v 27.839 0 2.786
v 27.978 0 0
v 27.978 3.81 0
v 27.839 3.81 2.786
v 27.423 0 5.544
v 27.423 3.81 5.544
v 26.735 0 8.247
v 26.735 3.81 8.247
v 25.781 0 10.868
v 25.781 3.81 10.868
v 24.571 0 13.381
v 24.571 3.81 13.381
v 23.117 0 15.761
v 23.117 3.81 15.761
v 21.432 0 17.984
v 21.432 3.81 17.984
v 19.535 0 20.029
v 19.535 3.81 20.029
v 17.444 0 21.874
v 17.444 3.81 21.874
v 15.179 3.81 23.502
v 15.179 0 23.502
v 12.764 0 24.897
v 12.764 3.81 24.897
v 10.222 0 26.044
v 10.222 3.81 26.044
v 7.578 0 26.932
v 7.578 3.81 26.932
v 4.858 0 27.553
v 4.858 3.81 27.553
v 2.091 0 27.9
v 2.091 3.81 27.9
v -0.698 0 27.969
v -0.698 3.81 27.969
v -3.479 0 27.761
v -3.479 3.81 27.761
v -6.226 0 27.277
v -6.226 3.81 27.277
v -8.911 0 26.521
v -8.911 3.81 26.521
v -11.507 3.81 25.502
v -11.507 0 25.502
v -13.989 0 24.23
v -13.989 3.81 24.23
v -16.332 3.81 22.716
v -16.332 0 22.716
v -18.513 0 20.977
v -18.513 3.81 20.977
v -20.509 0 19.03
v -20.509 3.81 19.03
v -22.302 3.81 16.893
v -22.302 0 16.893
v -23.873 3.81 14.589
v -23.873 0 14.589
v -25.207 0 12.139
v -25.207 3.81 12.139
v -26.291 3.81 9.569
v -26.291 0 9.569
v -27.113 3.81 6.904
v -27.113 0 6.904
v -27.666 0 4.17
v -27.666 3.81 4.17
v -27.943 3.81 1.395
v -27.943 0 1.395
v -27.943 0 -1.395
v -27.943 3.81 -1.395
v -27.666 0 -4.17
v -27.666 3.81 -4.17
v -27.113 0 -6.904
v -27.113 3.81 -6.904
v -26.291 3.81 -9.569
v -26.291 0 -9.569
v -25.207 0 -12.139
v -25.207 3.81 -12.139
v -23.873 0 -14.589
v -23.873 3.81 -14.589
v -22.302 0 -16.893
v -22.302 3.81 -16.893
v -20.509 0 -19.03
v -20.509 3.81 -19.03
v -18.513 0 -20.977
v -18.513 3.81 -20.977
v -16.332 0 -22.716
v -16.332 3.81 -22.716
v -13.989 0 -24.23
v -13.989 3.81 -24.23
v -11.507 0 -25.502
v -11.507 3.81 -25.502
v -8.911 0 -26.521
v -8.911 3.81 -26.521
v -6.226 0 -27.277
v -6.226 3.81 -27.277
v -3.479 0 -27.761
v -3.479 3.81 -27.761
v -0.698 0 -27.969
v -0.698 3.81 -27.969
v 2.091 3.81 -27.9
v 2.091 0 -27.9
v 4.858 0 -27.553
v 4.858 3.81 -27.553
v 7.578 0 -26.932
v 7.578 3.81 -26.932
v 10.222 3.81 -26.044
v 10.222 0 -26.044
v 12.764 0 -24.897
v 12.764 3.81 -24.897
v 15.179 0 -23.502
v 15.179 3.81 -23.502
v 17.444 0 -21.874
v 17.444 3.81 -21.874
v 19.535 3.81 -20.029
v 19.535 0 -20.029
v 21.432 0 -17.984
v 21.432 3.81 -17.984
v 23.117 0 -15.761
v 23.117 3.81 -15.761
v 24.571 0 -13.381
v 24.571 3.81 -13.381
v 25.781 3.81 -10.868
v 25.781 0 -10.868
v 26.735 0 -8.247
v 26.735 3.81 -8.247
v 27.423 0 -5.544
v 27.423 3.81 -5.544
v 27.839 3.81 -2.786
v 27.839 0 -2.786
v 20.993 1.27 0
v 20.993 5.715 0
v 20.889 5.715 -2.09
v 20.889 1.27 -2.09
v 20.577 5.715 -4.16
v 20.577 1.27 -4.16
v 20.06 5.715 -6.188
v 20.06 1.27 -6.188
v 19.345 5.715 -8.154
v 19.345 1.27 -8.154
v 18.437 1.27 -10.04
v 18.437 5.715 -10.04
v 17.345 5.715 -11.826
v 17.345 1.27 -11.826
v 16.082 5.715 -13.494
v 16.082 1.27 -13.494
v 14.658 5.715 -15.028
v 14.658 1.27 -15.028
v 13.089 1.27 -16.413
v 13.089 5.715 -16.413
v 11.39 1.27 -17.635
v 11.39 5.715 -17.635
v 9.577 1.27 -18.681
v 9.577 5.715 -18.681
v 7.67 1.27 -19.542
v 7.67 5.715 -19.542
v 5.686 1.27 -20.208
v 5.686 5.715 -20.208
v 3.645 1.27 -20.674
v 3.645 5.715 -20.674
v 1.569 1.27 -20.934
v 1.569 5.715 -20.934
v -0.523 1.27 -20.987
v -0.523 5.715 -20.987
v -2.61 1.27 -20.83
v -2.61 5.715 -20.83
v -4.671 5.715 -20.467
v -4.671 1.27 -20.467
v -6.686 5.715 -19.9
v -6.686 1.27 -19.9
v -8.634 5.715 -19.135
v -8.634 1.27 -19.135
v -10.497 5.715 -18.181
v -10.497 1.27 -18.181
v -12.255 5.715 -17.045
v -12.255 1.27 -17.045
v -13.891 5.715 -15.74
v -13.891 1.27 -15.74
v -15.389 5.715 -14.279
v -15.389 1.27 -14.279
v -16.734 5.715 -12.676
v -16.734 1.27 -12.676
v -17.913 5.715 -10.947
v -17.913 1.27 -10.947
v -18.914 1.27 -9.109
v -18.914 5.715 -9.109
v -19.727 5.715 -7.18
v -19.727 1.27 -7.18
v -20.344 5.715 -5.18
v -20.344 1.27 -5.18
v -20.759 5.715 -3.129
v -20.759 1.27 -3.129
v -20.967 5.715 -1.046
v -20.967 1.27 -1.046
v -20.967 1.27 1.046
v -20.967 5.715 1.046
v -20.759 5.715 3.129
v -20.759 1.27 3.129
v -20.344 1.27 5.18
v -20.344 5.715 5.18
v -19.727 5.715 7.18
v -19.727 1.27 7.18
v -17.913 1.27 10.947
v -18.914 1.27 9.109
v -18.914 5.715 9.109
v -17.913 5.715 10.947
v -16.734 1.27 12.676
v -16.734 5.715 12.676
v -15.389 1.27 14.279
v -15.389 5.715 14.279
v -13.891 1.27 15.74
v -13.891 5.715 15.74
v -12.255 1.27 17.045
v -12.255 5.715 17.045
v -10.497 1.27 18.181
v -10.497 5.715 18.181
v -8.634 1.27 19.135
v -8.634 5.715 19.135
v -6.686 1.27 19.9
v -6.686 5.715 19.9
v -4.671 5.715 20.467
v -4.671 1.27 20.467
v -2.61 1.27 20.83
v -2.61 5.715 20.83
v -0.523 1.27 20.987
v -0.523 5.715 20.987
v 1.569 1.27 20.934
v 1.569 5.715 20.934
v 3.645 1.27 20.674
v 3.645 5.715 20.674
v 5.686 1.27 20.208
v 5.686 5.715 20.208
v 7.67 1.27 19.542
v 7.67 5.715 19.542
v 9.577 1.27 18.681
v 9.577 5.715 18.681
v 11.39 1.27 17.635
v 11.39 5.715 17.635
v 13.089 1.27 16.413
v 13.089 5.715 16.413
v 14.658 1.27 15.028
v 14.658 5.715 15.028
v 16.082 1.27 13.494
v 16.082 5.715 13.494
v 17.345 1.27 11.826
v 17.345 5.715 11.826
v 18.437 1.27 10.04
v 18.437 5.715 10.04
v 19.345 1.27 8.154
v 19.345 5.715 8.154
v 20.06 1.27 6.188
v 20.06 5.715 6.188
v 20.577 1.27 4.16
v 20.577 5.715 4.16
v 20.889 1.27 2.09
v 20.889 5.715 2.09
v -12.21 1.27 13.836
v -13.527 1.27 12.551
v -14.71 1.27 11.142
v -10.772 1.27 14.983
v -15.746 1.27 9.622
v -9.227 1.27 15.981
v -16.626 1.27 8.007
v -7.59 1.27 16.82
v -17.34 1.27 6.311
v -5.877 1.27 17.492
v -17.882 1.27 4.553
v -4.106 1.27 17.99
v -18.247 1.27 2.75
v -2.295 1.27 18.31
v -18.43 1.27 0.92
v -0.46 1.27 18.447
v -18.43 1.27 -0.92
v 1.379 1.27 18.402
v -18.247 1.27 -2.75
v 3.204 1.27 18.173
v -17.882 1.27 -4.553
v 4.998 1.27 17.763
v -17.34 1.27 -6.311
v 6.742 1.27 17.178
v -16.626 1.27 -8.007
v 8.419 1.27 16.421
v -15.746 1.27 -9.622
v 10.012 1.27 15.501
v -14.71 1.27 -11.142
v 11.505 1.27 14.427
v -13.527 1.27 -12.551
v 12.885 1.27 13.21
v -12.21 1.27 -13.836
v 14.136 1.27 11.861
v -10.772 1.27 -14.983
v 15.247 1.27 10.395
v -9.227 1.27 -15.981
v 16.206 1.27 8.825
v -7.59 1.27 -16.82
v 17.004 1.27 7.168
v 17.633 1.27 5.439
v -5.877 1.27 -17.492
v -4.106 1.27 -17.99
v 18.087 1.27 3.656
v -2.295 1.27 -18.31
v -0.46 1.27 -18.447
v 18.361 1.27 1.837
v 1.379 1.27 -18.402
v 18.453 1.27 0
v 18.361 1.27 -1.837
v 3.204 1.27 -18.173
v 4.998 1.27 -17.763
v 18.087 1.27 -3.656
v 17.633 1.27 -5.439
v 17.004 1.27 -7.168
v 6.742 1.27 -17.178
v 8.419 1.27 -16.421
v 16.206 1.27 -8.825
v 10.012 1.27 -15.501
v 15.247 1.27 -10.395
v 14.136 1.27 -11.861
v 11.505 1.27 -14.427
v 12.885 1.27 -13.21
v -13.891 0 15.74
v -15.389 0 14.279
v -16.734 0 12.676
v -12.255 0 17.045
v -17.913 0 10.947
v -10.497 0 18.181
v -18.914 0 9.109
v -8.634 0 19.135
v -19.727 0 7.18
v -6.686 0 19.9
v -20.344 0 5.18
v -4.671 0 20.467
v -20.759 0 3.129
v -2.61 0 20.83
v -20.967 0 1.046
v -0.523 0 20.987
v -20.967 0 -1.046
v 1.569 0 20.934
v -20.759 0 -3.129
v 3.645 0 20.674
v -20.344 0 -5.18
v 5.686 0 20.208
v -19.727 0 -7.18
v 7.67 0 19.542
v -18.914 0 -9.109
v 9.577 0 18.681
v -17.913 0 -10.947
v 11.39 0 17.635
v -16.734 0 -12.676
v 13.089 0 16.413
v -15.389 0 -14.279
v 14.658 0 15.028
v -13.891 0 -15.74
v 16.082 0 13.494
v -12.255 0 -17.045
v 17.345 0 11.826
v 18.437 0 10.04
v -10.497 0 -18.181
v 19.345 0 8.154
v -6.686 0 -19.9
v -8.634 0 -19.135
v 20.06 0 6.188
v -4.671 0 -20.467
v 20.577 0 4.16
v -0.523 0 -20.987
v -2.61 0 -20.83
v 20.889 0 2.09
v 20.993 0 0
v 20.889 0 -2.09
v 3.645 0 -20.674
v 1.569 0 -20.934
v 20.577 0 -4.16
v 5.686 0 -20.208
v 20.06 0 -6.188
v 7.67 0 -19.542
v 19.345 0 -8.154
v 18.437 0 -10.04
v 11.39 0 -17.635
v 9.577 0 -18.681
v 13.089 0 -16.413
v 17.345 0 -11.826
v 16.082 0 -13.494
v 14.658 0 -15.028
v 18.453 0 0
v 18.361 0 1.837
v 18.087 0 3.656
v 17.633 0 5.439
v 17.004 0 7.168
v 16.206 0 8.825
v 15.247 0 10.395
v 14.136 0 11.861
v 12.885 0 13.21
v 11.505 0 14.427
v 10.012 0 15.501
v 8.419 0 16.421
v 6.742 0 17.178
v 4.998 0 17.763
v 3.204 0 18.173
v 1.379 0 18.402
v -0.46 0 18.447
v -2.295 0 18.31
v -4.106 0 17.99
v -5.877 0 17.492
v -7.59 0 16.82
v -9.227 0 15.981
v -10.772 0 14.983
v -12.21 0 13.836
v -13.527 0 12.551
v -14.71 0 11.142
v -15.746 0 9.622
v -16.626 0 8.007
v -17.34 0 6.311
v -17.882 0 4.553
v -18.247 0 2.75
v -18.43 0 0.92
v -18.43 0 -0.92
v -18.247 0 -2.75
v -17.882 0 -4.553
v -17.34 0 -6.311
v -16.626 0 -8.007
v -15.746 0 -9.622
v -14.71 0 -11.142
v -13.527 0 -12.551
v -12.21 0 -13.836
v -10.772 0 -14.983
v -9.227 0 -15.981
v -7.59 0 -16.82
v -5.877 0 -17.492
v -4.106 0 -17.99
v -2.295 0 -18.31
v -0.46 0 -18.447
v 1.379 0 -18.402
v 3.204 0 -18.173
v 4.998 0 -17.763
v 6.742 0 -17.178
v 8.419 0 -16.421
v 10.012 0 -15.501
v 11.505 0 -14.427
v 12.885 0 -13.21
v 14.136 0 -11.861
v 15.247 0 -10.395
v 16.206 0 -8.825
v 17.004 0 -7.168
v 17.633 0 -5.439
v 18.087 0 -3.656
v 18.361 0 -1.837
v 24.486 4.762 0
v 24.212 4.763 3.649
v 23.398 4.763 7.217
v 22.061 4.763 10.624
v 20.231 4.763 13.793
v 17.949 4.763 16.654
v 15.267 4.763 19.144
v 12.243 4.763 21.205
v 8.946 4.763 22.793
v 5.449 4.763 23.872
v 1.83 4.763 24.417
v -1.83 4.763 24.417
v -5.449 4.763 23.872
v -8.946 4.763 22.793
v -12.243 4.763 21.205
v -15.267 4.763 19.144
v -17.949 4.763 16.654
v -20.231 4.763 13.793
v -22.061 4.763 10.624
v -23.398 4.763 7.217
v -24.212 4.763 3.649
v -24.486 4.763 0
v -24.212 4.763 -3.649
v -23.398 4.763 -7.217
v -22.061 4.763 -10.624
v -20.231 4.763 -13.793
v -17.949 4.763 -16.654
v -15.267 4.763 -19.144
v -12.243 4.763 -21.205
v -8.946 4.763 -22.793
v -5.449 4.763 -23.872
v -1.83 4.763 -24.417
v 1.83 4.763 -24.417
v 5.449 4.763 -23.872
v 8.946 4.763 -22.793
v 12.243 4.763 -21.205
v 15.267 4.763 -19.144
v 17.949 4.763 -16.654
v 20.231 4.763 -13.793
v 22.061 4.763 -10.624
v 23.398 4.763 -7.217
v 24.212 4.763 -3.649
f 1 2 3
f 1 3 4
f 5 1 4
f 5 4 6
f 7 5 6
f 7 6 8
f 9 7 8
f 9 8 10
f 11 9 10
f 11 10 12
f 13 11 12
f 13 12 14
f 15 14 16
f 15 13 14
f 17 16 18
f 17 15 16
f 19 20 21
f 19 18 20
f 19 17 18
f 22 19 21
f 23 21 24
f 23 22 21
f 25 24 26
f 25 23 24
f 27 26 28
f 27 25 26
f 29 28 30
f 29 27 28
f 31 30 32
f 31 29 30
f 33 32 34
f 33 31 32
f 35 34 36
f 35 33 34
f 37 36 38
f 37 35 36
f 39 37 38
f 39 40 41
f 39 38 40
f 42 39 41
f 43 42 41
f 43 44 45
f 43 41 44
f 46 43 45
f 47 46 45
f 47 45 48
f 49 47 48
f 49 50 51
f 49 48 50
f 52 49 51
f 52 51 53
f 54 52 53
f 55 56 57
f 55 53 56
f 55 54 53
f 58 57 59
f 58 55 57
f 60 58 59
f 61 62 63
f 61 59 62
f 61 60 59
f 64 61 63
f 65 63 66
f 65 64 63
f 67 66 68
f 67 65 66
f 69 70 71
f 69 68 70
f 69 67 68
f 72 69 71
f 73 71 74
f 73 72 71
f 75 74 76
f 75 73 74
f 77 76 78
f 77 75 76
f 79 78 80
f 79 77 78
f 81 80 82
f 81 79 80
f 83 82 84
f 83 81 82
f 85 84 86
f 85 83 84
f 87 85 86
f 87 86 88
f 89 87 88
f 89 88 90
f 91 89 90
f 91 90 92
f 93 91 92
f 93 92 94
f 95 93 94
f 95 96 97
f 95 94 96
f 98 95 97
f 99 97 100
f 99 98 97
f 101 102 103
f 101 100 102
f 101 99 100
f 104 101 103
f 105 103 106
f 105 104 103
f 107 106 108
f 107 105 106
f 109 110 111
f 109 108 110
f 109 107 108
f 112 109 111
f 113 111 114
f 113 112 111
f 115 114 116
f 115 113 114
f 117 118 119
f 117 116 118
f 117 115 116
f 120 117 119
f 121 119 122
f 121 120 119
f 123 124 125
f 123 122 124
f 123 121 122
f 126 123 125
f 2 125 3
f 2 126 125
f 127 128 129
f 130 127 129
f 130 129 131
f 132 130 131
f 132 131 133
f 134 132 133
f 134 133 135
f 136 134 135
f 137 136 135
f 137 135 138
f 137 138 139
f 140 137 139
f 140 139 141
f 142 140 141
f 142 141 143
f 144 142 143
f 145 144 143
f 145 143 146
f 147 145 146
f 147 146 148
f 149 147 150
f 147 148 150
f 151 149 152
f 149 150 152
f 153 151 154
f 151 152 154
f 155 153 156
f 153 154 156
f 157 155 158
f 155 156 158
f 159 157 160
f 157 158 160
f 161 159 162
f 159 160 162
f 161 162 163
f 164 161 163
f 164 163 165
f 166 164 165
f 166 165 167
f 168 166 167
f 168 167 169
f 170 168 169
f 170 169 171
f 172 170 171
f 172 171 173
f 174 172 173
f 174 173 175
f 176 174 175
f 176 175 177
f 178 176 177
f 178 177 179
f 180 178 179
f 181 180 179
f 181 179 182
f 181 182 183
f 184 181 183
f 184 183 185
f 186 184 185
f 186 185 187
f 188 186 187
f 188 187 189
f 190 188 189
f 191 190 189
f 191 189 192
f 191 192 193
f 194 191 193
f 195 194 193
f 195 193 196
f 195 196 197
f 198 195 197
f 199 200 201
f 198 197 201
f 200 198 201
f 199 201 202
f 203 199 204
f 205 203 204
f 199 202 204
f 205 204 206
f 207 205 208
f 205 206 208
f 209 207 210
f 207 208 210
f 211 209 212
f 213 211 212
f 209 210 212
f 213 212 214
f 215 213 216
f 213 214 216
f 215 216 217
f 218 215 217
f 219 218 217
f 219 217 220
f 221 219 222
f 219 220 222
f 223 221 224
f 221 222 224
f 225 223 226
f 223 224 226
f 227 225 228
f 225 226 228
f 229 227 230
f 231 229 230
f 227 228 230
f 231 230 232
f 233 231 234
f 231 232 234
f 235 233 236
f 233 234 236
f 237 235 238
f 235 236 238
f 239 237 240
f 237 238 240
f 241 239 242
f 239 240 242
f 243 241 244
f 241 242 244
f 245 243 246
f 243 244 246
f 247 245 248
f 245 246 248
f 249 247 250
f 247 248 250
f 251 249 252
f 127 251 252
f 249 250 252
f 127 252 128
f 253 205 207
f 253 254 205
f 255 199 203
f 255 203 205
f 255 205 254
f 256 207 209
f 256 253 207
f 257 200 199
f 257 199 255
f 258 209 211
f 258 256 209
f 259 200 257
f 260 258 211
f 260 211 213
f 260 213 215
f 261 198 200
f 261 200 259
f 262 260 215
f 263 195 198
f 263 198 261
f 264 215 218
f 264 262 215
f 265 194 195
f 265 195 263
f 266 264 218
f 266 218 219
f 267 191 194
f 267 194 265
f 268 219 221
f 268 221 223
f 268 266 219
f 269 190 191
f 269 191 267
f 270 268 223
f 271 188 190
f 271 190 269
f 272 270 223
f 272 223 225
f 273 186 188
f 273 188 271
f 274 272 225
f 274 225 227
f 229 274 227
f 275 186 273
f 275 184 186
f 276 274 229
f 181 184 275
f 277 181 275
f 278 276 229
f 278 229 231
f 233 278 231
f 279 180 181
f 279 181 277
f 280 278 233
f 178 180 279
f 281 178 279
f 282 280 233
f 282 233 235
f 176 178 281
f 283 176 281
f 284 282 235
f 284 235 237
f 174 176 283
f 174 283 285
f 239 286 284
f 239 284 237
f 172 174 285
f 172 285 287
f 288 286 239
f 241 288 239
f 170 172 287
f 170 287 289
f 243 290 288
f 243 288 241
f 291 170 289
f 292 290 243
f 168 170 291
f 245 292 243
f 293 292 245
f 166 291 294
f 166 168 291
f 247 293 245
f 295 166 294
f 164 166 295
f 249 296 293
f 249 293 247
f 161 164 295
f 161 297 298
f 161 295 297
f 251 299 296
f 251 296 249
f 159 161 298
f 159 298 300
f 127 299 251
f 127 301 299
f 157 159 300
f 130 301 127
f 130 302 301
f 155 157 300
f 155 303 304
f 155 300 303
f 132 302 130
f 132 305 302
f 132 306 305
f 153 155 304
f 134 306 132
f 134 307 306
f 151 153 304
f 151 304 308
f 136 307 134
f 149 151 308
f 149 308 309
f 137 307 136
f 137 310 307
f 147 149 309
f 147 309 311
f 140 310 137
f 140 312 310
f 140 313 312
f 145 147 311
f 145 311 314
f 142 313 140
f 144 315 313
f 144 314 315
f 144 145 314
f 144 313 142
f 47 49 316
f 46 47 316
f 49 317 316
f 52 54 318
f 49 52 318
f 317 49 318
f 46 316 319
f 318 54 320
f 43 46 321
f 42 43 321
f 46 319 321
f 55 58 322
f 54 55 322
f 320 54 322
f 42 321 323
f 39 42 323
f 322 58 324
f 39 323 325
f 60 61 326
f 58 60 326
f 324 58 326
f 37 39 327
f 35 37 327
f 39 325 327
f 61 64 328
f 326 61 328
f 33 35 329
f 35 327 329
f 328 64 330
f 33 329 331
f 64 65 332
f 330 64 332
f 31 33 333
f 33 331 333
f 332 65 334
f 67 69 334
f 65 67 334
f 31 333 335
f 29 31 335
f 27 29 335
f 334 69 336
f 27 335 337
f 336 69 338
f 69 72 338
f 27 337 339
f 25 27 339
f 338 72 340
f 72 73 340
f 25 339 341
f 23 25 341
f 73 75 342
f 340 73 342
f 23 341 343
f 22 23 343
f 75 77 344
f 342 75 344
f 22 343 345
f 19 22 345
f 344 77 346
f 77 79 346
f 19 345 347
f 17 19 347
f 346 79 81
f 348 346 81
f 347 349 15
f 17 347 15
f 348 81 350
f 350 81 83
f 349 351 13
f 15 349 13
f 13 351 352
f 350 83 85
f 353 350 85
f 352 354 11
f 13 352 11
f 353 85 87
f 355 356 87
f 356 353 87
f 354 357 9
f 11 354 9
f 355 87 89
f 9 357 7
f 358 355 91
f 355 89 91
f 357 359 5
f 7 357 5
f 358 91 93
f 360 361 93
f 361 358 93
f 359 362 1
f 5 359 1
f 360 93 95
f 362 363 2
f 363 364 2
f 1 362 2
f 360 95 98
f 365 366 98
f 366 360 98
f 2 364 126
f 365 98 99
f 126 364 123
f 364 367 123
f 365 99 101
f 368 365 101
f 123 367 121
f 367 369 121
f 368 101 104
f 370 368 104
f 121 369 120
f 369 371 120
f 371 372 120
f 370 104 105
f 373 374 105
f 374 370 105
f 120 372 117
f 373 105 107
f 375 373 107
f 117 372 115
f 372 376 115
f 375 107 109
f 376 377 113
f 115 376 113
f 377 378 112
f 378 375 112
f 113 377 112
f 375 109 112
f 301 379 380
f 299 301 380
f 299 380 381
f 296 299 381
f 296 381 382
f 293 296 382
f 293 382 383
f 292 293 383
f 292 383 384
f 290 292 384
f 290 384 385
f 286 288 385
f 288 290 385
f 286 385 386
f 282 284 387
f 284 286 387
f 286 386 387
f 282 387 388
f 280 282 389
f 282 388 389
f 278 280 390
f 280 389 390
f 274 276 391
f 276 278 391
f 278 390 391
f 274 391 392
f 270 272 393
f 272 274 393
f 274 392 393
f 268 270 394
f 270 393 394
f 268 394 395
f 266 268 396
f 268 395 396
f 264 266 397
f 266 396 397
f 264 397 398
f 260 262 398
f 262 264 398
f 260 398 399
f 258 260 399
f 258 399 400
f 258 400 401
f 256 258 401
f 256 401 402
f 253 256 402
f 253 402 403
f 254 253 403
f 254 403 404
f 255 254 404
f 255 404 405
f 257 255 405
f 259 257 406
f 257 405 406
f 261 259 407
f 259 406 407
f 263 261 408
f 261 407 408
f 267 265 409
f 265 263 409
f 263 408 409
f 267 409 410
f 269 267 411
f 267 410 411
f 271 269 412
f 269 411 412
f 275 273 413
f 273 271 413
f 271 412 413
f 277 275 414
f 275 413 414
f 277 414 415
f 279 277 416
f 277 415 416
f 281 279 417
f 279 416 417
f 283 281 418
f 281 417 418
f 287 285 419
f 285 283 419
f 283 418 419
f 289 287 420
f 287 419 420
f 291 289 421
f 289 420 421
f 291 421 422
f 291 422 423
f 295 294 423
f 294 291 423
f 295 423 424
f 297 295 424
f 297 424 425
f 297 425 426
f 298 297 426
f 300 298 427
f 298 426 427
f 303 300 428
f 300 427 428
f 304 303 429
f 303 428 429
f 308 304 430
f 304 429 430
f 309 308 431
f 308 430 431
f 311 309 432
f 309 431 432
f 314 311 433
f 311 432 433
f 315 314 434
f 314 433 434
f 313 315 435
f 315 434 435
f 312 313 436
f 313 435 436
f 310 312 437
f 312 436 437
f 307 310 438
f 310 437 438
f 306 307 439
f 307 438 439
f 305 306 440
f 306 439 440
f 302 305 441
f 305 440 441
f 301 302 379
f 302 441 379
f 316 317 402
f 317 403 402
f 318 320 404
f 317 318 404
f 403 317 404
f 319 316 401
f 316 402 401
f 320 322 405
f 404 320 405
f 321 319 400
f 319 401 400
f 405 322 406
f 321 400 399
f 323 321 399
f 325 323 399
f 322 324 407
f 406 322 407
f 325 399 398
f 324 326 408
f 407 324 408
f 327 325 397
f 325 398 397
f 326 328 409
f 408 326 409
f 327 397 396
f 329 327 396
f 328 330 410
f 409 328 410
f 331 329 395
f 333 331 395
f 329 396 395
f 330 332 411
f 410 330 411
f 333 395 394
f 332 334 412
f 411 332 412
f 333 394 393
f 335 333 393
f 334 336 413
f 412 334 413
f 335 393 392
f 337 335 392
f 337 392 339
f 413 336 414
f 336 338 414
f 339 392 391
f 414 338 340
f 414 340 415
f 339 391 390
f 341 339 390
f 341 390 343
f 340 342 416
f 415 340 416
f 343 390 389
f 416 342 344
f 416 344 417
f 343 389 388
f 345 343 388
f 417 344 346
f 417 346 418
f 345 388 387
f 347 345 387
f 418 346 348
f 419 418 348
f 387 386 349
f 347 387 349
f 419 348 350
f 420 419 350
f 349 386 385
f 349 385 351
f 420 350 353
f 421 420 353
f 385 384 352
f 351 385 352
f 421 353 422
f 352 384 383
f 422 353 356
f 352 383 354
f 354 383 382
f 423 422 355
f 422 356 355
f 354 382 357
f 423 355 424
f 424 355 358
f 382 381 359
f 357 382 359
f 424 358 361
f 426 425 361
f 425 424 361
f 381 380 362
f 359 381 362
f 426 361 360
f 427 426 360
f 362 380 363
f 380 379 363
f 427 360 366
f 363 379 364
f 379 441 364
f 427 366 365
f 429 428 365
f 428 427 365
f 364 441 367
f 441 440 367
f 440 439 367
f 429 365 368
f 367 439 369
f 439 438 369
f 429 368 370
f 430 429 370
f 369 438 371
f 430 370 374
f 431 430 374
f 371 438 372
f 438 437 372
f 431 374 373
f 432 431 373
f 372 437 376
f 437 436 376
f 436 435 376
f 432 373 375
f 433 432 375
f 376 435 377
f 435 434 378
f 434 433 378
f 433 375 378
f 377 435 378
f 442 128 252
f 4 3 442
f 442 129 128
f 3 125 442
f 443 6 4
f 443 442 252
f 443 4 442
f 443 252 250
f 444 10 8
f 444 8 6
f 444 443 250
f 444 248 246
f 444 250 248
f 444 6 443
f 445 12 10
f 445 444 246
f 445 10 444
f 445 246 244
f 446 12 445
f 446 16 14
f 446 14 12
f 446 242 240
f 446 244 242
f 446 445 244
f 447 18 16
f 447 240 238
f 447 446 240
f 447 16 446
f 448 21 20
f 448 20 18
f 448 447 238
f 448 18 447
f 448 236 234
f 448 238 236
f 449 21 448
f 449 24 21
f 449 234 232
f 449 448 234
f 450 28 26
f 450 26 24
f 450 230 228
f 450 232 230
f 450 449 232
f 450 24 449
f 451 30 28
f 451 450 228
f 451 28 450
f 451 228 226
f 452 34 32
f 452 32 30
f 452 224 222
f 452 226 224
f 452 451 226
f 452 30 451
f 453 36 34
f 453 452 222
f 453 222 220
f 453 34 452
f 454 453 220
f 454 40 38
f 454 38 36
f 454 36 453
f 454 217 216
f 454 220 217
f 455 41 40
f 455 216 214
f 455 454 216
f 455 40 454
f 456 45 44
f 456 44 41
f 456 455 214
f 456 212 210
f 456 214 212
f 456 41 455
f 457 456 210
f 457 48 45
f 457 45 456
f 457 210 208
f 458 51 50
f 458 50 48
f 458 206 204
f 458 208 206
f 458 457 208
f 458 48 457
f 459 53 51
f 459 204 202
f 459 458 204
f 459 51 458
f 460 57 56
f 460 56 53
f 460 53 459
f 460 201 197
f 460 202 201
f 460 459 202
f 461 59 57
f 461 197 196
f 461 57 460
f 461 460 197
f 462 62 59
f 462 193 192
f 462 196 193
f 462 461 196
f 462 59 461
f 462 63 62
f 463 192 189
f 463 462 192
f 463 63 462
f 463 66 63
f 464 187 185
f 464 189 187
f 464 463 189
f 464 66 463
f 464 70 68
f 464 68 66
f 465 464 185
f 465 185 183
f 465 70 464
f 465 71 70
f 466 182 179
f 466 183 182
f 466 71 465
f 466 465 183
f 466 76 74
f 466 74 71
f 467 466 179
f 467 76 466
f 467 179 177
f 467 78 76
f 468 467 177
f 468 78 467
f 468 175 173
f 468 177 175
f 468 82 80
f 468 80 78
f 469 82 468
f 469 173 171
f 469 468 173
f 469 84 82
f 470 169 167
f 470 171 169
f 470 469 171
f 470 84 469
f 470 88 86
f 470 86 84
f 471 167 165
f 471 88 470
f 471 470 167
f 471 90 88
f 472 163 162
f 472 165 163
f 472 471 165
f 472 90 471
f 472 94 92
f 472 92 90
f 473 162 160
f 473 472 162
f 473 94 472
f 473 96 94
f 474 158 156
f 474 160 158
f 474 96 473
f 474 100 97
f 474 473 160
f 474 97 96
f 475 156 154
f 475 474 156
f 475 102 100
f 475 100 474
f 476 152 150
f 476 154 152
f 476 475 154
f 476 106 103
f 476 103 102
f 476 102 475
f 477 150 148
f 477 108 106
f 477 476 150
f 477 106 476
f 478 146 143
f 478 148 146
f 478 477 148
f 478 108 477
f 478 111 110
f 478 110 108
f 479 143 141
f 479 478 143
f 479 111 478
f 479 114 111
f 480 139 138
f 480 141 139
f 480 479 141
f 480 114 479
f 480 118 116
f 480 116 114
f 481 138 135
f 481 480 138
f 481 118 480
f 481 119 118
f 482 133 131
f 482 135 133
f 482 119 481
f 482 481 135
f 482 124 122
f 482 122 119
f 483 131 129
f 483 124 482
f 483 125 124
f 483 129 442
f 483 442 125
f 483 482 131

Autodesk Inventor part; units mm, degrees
ref_plane "YZ Plane" through (0, 0, 0) normal (1, 0, 0) x (0, 1, 0)
ref_plane "XZ Plane" through (0, 0, 0) normal (0, 1, 0) x (-1, 0, 0)
ref_plane "XY Plane" through (0, 0, 0) normal (0, 0, 1) x (1, 0, 0)
sketch "Sketch1" plane through (0, 0, 0) normal (0, 0, 1) x (1, 0, 0)
  line L0 (0, 0) -> (0, 8.6646) construction
  line L1 (20.9931, 1.27) -> (20.9931, 5.715)
  line L2 (20.9931, 5.715) -> (27.9781, 3.81)
  line L3 (27.9781, 3.81) -> (27.9781, 0)
  line L4 (27.9781, 0) -> (20.9931, 0)
  line L5 (20.9931, 1.27) -> (18.4531, 1.27)
  line L6 (18.4531, 1.27) -> (18.4531, 0)
  line L7 (18.4531, 0) -> (20.9931, 0)
  dimension "d0" = 20.9931
  dimension "d1" = 4.445
  dimension "d2" = 1.27
  dimension "d3" = 2.54
  dimension "d4" = 3.81
  dimension "d5" = 6.985
revolve "Revolution1" add sketch "Sketch1" angle 360 about axis through (0, 0, 0) along (0, 1, 0)
properties part number "Team Pin Base"
